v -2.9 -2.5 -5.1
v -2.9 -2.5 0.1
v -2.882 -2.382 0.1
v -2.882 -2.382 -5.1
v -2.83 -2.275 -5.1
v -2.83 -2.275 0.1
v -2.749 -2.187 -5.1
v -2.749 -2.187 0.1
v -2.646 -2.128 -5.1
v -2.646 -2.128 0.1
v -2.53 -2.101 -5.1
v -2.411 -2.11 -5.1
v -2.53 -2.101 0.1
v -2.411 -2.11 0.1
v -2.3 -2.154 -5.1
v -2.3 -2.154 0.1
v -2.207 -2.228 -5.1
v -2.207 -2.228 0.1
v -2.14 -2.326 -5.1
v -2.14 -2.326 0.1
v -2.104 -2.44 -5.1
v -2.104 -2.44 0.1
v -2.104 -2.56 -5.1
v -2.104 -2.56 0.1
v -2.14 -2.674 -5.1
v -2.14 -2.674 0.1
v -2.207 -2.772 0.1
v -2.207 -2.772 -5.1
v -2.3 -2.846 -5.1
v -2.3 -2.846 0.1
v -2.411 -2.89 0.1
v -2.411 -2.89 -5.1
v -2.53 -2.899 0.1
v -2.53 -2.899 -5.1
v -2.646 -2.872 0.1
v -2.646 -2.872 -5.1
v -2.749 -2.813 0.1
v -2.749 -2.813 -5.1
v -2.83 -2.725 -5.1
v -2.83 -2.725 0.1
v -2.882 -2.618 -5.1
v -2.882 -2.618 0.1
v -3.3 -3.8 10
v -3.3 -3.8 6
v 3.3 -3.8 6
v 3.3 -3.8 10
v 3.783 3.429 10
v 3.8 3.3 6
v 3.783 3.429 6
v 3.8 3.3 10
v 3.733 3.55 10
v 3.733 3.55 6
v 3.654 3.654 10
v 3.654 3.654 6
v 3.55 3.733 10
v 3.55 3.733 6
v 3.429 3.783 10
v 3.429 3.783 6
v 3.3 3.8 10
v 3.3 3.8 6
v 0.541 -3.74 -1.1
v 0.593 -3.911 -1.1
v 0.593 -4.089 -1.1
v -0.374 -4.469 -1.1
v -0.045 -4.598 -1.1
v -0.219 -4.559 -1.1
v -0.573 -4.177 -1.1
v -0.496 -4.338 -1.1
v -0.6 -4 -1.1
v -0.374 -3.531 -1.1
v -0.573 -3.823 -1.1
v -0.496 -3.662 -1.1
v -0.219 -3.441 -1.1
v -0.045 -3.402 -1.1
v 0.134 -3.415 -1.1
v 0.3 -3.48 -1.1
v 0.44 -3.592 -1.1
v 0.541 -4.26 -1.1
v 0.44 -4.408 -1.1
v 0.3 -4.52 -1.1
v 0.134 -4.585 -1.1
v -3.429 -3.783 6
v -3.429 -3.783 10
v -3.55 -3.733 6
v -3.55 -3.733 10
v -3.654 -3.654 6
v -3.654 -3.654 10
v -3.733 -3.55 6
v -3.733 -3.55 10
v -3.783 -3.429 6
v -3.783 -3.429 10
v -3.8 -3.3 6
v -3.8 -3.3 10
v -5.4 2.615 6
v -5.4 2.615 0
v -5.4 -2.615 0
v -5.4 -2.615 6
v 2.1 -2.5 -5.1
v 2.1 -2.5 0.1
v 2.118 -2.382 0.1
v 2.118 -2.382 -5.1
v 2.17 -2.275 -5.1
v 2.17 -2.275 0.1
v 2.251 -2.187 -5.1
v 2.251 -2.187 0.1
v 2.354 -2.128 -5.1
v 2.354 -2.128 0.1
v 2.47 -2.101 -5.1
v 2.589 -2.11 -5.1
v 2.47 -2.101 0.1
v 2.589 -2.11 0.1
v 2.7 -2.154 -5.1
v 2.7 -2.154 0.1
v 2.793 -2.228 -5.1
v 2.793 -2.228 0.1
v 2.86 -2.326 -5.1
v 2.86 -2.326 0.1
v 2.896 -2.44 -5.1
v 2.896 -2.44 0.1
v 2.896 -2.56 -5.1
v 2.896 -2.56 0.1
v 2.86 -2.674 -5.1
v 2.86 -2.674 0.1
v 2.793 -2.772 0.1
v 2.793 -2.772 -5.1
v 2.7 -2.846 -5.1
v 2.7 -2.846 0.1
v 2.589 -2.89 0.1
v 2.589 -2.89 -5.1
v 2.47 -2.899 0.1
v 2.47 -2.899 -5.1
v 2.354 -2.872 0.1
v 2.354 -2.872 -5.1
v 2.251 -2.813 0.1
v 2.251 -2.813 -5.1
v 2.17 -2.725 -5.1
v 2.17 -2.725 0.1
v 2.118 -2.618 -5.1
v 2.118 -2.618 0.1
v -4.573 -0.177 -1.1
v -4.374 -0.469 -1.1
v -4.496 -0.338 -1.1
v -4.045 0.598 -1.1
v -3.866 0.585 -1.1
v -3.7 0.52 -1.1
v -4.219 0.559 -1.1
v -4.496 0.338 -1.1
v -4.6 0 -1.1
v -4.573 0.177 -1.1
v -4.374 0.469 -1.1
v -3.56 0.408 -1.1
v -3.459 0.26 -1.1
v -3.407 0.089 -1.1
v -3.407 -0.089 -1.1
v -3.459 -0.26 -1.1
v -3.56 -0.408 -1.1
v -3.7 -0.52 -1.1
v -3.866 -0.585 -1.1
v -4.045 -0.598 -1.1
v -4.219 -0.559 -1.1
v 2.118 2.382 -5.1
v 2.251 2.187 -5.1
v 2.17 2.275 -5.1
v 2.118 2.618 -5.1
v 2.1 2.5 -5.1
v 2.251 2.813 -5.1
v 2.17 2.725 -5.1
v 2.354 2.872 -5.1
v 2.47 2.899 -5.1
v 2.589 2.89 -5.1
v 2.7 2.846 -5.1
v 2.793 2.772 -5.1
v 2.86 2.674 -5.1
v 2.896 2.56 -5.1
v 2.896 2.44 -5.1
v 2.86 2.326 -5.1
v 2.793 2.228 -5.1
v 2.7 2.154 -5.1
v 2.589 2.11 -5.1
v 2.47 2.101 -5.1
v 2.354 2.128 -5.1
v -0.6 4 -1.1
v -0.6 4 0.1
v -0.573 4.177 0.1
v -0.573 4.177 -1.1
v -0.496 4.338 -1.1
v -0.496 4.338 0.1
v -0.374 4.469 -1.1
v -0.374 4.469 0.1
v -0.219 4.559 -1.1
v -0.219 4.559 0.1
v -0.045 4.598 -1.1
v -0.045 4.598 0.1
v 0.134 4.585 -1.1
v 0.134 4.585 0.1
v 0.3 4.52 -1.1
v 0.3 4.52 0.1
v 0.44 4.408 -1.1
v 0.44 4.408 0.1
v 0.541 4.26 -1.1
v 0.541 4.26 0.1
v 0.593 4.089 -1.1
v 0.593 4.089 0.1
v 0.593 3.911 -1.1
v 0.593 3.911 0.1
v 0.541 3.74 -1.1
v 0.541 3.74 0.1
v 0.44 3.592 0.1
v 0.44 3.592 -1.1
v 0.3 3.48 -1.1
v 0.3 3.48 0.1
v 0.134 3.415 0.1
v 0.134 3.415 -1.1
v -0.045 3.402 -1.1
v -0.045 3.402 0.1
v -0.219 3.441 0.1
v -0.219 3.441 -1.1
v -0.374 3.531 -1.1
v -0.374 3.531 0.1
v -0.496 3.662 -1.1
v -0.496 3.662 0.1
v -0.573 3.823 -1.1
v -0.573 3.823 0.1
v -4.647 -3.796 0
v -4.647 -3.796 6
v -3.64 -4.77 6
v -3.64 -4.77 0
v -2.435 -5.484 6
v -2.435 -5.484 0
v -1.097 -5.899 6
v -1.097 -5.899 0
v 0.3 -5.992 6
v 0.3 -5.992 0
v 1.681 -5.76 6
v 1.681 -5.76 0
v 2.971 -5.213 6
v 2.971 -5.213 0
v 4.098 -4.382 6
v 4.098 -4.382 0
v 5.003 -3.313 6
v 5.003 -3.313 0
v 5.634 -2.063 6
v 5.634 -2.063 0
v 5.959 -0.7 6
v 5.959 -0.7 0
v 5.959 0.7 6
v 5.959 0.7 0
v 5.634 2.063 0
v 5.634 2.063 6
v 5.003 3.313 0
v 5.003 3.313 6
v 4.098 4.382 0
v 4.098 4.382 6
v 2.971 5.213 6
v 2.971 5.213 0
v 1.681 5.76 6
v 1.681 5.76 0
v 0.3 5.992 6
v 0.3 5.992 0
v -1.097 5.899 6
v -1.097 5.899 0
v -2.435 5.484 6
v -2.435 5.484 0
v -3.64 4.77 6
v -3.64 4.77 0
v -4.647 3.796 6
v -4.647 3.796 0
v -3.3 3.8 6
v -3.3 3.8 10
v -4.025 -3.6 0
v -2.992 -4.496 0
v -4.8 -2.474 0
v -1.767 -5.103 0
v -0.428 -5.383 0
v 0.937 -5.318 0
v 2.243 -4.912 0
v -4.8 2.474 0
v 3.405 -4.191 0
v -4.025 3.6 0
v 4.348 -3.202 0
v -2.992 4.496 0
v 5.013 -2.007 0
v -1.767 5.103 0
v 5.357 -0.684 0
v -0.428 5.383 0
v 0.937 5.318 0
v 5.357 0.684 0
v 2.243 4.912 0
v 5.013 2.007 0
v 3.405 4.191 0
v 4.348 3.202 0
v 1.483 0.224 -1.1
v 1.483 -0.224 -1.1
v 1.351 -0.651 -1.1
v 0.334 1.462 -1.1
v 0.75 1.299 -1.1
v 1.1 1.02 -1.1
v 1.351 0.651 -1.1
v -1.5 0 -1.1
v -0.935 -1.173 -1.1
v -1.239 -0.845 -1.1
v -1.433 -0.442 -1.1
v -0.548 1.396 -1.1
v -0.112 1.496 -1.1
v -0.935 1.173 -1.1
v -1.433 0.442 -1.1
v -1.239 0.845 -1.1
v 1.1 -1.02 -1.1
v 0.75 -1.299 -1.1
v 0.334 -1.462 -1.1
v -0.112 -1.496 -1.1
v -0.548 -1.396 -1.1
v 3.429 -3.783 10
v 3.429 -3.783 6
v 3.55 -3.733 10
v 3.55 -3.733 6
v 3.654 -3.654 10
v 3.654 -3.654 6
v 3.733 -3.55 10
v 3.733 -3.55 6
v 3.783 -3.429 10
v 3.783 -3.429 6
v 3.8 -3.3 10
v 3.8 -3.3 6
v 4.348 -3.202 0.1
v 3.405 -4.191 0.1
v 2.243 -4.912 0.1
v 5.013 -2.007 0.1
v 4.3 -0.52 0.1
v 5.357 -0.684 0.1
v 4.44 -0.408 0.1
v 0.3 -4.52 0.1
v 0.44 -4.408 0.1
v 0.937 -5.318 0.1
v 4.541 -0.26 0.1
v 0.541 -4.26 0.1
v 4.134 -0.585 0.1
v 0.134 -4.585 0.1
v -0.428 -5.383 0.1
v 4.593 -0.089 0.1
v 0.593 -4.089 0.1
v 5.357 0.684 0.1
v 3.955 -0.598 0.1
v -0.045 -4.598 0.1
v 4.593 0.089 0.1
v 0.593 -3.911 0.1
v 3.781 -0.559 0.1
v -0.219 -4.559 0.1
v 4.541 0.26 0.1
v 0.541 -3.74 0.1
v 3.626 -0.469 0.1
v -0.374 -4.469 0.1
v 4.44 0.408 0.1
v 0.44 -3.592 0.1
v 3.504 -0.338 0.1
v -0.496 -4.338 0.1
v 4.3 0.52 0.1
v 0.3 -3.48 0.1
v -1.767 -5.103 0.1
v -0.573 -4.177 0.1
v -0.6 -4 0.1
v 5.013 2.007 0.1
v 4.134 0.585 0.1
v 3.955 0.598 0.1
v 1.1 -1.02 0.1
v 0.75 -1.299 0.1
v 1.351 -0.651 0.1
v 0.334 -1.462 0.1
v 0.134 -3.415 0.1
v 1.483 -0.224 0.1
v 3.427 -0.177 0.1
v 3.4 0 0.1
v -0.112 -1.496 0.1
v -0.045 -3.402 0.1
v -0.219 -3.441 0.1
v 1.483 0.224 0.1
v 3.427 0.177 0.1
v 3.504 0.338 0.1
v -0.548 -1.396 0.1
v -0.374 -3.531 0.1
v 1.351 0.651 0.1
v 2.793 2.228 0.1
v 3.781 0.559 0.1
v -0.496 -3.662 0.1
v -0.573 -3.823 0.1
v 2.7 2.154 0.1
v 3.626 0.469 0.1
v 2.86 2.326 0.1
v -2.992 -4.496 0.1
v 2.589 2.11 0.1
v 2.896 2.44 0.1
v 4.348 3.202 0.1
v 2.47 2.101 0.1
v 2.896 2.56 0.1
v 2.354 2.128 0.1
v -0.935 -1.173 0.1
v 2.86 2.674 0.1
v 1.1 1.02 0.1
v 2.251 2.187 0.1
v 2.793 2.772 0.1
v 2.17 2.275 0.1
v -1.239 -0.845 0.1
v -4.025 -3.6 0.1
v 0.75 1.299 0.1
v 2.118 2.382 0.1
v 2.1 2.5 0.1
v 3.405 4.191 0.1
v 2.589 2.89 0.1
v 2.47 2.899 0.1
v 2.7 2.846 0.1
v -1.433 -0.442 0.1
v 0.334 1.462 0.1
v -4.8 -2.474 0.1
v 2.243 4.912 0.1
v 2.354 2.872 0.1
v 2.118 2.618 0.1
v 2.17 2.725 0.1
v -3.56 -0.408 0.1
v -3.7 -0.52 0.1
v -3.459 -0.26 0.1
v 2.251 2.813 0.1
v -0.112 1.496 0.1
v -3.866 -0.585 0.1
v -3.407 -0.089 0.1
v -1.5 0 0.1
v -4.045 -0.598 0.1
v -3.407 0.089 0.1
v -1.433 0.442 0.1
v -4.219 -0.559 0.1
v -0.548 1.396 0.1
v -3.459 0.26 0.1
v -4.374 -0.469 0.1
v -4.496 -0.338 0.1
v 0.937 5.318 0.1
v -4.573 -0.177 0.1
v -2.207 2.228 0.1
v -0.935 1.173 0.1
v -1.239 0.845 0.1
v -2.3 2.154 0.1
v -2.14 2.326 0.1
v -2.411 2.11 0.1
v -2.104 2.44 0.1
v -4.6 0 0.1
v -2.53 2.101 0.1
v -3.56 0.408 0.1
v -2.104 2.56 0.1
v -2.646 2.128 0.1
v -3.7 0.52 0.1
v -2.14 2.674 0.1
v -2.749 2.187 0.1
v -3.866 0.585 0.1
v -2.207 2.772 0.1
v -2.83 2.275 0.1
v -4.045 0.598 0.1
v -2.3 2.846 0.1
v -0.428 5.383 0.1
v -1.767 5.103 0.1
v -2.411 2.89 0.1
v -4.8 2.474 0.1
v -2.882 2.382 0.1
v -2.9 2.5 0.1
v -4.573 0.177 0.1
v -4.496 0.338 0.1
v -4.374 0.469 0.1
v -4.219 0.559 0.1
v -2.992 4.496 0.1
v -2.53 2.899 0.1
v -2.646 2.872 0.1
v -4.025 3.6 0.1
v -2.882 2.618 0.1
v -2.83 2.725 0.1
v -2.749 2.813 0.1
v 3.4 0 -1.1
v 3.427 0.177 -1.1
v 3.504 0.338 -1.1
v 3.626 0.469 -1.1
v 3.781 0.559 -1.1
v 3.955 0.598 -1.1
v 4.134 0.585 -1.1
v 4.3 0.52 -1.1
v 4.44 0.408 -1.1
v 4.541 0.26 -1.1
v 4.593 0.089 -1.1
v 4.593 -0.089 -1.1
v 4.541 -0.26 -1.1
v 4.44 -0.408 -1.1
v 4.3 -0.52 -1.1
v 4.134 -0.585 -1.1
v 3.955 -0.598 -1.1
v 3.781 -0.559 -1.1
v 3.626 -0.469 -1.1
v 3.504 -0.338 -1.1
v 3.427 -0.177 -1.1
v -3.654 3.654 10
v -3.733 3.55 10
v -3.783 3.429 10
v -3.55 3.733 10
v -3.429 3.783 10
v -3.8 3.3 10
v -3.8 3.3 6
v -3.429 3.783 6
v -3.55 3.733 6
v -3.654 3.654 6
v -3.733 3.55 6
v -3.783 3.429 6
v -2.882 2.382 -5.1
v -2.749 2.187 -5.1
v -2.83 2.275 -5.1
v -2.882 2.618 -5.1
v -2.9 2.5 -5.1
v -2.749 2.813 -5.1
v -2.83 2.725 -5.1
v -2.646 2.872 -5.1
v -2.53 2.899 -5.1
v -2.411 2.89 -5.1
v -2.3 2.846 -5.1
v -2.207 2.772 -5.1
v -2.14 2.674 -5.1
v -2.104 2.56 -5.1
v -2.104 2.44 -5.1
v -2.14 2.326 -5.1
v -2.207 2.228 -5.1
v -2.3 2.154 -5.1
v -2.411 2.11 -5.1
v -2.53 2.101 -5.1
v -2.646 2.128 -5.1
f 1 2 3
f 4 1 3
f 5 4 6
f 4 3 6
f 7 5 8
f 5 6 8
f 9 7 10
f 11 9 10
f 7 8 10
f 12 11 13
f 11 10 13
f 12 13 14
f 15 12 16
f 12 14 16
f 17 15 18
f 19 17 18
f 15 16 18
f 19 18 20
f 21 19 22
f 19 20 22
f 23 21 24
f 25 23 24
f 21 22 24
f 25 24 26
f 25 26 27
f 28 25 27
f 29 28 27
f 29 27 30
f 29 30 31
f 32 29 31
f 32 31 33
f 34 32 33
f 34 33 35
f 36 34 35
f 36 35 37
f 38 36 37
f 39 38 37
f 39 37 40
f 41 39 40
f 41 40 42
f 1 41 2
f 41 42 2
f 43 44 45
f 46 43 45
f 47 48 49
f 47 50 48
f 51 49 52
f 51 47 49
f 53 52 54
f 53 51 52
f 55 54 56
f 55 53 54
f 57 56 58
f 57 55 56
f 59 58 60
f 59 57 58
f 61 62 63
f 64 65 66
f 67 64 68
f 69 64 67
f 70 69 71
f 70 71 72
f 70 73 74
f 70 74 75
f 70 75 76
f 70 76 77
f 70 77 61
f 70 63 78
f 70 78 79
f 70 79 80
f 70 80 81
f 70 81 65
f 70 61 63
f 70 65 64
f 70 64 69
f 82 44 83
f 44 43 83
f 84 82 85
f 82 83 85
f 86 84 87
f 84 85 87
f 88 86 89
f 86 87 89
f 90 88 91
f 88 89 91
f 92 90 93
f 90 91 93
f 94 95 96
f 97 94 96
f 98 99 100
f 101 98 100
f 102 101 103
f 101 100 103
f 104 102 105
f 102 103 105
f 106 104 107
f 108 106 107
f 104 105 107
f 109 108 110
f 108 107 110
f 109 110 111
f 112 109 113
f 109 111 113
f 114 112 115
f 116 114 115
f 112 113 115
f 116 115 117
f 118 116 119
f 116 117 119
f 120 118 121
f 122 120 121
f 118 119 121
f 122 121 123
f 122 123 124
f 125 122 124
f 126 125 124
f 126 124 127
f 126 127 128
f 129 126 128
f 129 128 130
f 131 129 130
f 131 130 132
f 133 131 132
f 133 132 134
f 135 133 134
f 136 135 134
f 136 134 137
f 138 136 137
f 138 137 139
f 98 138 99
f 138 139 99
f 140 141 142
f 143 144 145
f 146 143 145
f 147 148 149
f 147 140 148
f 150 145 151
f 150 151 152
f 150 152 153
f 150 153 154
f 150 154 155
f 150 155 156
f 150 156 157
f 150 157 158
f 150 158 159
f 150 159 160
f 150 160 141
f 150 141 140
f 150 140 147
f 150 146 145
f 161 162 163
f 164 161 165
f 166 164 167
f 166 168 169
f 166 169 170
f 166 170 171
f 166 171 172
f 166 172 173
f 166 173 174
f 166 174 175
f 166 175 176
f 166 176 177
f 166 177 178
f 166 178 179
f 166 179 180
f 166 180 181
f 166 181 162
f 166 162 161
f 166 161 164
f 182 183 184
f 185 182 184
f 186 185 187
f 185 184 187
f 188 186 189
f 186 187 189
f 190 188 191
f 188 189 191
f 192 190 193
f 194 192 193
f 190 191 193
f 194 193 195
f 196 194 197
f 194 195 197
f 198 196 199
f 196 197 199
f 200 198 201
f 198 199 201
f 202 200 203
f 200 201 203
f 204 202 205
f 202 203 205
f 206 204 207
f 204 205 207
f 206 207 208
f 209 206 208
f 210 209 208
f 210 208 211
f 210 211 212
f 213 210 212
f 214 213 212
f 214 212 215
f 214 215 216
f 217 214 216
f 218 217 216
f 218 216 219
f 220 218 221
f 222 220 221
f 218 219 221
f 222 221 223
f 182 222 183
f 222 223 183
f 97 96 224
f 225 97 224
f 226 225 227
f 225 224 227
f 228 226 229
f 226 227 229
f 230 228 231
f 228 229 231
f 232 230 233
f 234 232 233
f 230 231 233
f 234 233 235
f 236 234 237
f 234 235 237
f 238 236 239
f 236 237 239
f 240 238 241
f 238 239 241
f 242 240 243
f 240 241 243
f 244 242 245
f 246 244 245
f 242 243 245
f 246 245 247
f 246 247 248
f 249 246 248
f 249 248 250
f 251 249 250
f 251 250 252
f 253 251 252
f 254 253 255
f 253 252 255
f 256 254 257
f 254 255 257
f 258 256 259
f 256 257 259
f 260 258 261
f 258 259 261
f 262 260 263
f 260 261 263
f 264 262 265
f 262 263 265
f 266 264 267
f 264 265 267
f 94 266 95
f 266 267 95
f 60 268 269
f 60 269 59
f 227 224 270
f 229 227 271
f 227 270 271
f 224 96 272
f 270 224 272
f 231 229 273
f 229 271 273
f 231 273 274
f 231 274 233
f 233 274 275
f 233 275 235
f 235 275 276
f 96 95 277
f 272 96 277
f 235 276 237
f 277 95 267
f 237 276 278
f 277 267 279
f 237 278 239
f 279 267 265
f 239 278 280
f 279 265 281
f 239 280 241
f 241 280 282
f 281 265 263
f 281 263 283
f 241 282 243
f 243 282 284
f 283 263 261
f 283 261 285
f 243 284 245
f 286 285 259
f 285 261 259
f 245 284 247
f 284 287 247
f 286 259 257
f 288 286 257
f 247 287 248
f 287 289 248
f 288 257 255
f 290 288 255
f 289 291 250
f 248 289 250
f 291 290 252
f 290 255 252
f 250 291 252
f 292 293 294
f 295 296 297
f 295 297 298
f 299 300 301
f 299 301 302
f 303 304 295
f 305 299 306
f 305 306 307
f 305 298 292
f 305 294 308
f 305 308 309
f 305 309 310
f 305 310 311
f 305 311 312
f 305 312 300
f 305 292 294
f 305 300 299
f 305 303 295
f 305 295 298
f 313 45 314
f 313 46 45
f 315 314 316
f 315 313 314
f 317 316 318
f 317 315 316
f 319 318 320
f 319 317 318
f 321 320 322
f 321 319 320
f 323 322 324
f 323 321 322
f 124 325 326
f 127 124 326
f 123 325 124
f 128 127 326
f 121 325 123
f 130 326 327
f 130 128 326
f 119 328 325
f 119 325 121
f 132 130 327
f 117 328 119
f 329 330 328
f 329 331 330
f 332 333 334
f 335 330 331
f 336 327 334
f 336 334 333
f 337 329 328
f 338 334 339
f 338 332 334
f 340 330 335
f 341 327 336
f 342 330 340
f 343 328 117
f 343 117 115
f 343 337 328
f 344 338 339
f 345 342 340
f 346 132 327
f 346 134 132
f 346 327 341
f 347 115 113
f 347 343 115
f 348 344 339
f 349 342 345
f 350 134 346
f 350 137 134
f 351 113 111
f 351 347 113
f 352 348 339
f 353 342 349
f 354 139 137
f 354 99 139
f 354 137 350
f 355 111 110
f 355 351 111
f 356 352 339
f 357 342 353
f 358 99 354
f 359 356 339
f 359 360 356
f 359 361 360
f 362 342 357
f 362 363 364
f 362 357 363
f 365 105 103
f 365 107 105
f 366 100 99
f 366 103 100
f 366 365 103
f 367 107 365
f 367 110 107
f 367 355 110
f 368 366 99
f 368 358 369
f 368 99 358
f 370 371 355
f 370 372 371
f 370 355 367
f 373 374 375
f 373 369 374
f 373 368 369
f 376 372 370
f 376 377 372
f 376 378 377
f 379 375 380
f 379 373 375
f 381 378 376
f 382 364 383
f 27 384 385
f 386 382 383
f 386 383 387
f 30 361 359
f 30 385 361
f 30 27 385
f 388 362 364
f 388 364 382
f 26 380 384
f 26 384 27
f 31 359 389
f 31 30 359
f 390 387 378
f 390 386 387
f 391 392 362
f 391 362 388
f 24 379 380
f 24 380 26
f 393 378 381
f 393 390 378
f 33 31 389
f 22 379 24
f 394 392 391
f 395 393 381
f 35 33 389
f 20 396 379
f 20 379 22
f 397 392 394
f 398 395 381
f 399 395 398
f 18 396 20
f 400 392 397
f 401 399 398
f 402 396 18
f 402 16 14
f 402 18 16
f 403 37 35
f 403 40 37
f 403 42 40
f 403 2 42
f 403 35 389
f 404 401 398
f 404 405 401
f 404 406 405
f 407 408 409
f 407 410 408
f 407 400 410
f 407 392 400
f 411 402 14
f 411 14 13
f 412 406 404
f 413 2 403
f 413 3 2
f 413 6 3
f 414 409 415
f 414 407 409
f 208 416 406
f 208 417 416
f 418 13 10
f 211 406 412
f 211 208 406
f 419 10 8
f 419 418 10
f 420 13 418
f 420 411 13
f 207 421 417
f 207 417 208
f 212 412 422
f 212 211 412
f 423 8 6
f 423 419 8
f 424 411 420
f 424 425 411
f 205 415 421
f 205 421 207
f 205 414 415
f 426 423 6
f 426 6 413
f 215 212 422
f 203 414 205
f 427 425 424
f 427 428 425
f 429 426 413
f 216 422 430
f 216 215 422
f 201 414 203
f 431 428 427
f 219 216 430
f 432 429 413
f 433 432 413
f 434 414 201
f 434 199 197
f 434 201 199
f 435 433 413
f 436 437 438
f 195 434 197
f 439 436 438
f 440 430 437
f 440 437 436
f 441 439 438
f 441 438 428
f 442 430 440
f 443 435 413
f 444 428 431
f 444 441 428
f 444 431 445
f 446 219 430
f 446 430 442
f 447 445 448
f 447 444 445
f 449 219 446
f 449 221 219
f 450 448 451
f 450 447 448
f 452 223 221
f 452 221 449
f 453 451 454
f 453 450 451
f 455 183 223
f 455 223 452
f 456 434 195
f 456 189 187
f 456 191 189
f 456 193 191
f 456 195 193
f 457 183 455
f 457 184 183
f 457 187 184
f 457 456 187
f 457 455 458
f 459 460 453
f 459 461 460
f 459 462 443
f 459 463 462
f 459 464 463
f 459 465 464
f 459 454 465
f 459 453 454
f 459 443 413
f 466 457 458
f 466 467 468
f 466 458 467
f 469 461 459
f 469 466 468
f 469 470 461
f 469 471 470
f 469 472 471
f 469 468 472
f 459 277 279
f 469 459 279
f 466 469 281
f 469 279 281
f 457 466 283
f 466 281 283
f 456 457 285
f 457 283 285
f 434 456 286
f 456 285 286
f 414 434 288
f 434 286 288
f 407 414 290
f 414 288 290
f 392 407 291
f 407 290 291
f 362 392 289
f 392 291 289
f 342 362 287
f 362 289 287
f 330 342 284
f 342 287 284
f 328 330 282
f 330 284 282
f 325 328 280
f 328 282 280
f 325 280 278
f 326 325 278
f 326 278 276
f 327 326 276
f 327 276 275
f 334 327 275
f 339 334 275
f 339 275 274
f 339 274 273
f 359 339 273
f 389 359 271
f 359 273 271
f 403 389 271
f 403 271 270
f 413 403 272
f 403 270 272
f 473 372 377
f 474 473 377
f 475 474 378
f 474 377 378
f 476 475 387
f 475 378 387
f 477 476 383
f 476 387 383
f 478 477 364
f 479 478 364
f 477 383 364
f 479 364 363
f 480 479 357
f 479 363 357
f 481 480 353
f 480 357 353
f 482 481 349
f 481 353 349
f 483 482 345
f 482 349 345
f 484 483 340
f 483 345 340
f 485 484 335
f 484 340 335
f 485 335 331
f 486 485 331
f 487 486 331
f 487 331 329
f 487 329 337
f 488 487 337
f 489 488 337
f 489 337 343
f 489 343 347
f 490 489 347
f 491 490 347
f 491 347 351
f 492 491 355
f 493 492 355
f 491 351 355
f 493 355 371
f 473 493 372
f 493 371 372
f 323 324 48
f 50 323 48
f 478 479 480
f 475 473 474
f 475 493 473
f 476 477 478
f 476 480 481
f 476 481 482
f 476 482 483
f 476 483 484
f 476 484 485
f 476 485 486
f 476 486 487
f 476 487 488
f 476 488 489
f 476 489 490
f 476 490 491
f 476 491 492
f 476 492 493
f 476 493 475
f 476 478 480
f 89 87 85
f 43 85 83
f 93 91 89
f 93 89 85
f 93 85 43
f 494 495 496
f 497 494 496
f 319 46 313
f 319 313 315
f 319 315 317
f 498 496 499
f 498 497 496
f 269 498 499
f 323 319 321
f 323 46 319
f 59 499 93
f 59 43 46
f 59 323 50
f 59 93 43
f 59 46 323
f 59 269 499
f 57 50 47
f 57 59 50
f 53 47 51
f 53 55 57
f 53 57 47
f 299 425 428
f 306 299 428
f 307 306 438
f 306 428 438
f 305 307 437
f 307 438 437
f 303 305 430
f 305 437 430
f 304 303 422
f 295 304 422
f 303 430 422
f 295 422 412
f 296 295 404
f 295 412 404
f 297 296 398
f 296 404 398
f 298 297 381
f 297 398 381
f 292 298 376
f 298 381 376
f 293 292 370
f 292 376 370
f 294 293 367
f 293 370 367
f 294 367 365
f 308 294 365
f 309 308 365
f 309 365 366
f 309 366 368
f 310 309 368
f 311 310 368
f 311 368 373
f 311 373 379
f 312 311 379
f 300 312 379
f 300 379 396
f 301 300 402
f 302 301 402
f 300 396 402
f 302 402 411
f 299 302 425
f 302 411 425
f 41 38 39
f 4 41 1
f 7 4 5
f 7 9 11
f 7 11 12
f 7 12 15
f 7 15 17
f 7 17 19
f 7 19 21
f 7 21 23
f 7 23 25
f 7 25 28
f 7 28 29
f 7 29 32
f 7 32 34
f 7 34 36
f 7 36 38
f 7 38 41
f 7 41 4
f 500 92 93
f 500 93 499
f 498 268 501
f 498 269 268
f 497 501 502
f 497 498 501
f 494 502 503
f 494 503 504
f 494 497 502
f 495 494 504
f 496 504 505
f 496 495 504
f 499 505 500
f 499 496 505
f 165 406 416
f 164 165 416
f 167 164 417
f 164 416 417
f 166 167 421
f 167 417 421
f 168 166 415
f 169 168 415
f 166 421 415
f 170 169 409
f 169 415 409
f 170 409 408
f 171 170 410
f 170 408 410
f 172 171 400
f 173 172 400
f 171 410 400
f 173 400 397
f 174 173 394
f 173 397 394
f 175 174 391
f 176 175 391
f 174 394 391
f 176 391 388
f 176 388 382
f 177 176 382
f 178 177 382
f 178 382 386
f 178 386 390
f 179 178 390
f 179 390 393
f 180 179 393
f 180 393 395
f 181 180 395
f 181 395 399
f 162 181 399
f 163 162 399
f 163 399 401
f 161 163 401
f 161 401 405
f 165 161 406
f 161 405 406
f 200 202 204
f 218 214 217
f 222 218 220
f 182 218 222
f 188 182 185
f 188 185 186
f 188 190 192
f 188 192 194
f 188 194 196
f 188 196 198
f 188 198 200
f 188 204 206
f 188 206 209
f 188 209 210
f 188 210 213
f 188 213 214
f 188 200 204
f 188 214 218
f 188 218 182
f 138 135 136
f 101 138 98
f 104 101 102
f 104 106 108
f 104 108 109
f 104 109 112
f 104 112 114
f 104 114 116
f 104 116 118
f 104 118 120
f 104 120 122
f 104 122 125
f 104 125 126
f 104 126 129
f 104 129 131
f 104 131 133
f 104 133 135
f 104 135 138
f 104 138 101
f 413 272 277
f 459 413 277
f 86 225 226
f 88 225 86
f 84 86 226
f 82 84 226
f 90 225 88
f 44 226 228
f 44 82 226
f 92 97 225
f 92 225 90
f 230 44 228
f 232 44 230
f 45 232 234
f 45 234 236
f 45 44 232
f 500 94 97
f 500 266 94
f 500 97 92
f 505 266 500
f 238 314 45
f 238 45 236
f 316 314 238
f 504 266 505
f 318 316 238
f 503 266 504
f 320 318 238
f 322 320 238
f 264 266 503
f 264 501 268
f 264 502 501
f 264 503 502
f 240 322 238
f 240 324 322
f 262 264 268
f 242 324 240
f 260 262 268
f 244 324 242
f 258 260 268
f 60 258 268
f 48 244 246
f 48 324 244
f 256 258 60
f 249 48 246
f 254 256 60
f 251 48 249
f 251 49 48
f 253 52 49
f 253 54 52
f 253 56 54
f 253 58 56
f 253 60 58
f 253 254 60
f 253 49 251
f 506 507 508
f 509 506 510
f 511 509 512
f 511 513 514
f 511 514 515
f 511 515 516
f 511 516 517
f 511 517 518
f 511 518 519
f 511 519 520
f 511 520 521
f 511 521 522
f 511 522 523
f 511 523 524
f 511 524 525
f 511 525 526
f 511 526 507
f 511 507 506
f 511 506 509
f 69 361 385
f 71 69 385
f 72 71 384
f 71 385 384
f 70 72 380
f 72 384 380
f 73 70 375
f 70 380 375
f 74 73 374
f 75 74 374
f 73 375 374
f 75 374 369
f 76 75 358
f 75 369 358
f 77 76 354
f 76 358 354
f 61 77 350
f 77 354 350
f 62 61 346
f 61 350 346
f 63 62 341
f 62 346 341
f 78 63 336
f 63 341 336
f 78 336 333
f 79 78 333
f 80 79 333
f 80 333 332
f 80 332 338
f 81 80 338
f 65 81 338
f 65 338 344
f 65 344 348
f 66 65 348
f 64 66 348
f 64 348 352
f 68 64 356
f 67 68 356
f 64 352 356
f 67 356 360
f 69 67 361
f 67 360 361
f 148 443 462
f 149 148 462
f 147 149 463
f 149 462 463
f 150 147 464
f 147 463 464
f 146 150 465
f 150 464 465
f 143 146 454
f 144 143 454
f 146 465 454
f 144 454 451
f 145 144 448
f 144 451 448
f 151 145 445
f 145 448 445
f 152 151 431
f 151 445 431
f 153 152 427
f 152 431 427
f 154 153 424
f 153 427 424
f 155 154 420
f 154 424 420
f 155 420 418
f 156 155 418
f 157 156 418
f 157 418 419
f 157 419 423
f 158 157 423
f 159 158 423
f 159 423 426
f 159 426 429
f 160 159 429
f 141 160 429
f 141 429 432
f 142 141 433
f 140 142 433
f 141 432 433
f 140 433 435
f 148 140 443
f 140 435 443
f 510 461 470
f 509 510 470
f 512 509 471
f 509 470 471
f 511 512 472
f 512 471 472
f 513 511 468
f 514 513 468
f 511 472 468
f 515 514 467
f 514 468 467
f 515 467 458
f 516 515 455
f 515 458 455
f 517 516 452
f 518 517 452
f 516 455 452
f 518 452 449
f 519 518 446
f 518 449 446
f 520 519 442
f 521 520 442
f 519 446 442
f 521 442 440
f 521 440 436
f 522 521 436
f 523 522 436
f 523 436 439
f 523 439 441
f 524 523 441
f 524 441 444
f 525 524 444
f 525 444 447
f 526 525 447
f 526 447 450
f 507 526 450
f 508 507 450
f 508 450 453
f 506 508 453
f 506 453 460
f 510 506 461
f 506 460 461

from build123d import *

# Parameters (mm, degrees)
BOSS_EXTRU_1_DEPTH      = 6
ESQUISSE2_W             = 7.6
ESQUISSE2_H             = 7.6
BOSS_EXTRU_2_DEPTH      = 4
ENL_V_MAT_EXTRU_1_DEPTH = 0.1
ESQUISSE4_R             = 1.5
ESQUISSE4_R_2           = 0.6
BOSS_EXTRU_4_DEPTH      = 1.2
ESQUISSE5_R             = 0.4
BOSS_EXTRU_5_DEPTH      = 5.2
CONG_1_R                = 0.5


with BuildPart() as part:
    # Esquisse1 → Boss.-Extru.1 (new body)
    with BuildSketch(Plane.XY):
        with BuildLine():
            Line((-5.4, 2.615339366), (-5.4, -2.615339366))
            ThreePointArc((-5.4, -2.615339366), (6, 0), (-5.4, 2.615339366))
        make_face()
    extrude(amount=BOSS_EXTRU_1_DEPTH)

    # Esquisse2 → Boss.-Extru.2 (add)
    with BuildSketch(Plane.XY.offset(6)):
        Rectangle(ESQUISSE2_W, ESQUISSE2_H)
    extrude(amount=BOSS_EXTRU_2_DEPTH)

    # Esquisse3 → Enlèv. mat.-Extru.1 (cut)
    with BuildSketch(Plane(origin=(0, 0, 0), x_dir=(-1, 0, 0), z_dir=(0, 0, -1))):
        with BuildLine():
            Line((4.8, -2.473863375), (4.8, 2.473863375))
            ThreePointArc((4.8, 2.473863375), (-5.4, 0), (4.8, -2.473863375))
        make_face()
    extrude(amount=-ENL_V_MAT_EXTRU_1_DEPTH, mode=Mode.SUBTRACT)

    # Esquisse4 → Boss.-Extru.4 (add)
    with BuildSketch(Plane(origin=(0, 0, 0.1), x_dir=(-1, 0, 0), z_dir=(0, 0, -1))):
        Circle(ESQUISSE4_R)
        with Locations((0, -4)):
            Circle(ESQUISSE4_R_2)
        with Locations((-4, 0)):
            Circle(ESQUISSE4_R_2)
        with Locations((0, 4)):
            Circle(ESQUISSE4_R_2)
        with Locations((4, 0)):
            Circle(ESQUISSE4_R_2)
    extrude(amount=BOSS_EXTRU_4_DEPTH)

    # Esquisse5 → Boss.-Extru.5 (add)
    with BuildSketch(Plane(origin=(0, 0, 0.1), x_dir=(-1, 0, 0), z_dir=(0, 0, -1))):
        with Locations((2.5, -2.5)):
            Circle(ESQUISSE5_R)
        with Locations((-2.5, -2.5)):
            Circle(ESQUISSE5_R)
        with Locations((-2.5, 2.5)):
            Circle(ESQUISSE5_R)
        with Locations((2.5, 2.5)):
            Circle(ESQUISSE5_R)
    extrude(amount=BOSS_EXTRU_5_DEPTH)

    # Congé1
    cong_1_edges = [part.edges().sort_by_distance(p)[0] for p in [
        (3.8, -3.8, 8),
        (3.8, 3.8, 8),
        (-3.8, 3.8, 8),
        (-3.8, -3.8, 8),
    ]]
    fillet(cong_1_edges, radius=CONG_1_R)


solid = part.part
